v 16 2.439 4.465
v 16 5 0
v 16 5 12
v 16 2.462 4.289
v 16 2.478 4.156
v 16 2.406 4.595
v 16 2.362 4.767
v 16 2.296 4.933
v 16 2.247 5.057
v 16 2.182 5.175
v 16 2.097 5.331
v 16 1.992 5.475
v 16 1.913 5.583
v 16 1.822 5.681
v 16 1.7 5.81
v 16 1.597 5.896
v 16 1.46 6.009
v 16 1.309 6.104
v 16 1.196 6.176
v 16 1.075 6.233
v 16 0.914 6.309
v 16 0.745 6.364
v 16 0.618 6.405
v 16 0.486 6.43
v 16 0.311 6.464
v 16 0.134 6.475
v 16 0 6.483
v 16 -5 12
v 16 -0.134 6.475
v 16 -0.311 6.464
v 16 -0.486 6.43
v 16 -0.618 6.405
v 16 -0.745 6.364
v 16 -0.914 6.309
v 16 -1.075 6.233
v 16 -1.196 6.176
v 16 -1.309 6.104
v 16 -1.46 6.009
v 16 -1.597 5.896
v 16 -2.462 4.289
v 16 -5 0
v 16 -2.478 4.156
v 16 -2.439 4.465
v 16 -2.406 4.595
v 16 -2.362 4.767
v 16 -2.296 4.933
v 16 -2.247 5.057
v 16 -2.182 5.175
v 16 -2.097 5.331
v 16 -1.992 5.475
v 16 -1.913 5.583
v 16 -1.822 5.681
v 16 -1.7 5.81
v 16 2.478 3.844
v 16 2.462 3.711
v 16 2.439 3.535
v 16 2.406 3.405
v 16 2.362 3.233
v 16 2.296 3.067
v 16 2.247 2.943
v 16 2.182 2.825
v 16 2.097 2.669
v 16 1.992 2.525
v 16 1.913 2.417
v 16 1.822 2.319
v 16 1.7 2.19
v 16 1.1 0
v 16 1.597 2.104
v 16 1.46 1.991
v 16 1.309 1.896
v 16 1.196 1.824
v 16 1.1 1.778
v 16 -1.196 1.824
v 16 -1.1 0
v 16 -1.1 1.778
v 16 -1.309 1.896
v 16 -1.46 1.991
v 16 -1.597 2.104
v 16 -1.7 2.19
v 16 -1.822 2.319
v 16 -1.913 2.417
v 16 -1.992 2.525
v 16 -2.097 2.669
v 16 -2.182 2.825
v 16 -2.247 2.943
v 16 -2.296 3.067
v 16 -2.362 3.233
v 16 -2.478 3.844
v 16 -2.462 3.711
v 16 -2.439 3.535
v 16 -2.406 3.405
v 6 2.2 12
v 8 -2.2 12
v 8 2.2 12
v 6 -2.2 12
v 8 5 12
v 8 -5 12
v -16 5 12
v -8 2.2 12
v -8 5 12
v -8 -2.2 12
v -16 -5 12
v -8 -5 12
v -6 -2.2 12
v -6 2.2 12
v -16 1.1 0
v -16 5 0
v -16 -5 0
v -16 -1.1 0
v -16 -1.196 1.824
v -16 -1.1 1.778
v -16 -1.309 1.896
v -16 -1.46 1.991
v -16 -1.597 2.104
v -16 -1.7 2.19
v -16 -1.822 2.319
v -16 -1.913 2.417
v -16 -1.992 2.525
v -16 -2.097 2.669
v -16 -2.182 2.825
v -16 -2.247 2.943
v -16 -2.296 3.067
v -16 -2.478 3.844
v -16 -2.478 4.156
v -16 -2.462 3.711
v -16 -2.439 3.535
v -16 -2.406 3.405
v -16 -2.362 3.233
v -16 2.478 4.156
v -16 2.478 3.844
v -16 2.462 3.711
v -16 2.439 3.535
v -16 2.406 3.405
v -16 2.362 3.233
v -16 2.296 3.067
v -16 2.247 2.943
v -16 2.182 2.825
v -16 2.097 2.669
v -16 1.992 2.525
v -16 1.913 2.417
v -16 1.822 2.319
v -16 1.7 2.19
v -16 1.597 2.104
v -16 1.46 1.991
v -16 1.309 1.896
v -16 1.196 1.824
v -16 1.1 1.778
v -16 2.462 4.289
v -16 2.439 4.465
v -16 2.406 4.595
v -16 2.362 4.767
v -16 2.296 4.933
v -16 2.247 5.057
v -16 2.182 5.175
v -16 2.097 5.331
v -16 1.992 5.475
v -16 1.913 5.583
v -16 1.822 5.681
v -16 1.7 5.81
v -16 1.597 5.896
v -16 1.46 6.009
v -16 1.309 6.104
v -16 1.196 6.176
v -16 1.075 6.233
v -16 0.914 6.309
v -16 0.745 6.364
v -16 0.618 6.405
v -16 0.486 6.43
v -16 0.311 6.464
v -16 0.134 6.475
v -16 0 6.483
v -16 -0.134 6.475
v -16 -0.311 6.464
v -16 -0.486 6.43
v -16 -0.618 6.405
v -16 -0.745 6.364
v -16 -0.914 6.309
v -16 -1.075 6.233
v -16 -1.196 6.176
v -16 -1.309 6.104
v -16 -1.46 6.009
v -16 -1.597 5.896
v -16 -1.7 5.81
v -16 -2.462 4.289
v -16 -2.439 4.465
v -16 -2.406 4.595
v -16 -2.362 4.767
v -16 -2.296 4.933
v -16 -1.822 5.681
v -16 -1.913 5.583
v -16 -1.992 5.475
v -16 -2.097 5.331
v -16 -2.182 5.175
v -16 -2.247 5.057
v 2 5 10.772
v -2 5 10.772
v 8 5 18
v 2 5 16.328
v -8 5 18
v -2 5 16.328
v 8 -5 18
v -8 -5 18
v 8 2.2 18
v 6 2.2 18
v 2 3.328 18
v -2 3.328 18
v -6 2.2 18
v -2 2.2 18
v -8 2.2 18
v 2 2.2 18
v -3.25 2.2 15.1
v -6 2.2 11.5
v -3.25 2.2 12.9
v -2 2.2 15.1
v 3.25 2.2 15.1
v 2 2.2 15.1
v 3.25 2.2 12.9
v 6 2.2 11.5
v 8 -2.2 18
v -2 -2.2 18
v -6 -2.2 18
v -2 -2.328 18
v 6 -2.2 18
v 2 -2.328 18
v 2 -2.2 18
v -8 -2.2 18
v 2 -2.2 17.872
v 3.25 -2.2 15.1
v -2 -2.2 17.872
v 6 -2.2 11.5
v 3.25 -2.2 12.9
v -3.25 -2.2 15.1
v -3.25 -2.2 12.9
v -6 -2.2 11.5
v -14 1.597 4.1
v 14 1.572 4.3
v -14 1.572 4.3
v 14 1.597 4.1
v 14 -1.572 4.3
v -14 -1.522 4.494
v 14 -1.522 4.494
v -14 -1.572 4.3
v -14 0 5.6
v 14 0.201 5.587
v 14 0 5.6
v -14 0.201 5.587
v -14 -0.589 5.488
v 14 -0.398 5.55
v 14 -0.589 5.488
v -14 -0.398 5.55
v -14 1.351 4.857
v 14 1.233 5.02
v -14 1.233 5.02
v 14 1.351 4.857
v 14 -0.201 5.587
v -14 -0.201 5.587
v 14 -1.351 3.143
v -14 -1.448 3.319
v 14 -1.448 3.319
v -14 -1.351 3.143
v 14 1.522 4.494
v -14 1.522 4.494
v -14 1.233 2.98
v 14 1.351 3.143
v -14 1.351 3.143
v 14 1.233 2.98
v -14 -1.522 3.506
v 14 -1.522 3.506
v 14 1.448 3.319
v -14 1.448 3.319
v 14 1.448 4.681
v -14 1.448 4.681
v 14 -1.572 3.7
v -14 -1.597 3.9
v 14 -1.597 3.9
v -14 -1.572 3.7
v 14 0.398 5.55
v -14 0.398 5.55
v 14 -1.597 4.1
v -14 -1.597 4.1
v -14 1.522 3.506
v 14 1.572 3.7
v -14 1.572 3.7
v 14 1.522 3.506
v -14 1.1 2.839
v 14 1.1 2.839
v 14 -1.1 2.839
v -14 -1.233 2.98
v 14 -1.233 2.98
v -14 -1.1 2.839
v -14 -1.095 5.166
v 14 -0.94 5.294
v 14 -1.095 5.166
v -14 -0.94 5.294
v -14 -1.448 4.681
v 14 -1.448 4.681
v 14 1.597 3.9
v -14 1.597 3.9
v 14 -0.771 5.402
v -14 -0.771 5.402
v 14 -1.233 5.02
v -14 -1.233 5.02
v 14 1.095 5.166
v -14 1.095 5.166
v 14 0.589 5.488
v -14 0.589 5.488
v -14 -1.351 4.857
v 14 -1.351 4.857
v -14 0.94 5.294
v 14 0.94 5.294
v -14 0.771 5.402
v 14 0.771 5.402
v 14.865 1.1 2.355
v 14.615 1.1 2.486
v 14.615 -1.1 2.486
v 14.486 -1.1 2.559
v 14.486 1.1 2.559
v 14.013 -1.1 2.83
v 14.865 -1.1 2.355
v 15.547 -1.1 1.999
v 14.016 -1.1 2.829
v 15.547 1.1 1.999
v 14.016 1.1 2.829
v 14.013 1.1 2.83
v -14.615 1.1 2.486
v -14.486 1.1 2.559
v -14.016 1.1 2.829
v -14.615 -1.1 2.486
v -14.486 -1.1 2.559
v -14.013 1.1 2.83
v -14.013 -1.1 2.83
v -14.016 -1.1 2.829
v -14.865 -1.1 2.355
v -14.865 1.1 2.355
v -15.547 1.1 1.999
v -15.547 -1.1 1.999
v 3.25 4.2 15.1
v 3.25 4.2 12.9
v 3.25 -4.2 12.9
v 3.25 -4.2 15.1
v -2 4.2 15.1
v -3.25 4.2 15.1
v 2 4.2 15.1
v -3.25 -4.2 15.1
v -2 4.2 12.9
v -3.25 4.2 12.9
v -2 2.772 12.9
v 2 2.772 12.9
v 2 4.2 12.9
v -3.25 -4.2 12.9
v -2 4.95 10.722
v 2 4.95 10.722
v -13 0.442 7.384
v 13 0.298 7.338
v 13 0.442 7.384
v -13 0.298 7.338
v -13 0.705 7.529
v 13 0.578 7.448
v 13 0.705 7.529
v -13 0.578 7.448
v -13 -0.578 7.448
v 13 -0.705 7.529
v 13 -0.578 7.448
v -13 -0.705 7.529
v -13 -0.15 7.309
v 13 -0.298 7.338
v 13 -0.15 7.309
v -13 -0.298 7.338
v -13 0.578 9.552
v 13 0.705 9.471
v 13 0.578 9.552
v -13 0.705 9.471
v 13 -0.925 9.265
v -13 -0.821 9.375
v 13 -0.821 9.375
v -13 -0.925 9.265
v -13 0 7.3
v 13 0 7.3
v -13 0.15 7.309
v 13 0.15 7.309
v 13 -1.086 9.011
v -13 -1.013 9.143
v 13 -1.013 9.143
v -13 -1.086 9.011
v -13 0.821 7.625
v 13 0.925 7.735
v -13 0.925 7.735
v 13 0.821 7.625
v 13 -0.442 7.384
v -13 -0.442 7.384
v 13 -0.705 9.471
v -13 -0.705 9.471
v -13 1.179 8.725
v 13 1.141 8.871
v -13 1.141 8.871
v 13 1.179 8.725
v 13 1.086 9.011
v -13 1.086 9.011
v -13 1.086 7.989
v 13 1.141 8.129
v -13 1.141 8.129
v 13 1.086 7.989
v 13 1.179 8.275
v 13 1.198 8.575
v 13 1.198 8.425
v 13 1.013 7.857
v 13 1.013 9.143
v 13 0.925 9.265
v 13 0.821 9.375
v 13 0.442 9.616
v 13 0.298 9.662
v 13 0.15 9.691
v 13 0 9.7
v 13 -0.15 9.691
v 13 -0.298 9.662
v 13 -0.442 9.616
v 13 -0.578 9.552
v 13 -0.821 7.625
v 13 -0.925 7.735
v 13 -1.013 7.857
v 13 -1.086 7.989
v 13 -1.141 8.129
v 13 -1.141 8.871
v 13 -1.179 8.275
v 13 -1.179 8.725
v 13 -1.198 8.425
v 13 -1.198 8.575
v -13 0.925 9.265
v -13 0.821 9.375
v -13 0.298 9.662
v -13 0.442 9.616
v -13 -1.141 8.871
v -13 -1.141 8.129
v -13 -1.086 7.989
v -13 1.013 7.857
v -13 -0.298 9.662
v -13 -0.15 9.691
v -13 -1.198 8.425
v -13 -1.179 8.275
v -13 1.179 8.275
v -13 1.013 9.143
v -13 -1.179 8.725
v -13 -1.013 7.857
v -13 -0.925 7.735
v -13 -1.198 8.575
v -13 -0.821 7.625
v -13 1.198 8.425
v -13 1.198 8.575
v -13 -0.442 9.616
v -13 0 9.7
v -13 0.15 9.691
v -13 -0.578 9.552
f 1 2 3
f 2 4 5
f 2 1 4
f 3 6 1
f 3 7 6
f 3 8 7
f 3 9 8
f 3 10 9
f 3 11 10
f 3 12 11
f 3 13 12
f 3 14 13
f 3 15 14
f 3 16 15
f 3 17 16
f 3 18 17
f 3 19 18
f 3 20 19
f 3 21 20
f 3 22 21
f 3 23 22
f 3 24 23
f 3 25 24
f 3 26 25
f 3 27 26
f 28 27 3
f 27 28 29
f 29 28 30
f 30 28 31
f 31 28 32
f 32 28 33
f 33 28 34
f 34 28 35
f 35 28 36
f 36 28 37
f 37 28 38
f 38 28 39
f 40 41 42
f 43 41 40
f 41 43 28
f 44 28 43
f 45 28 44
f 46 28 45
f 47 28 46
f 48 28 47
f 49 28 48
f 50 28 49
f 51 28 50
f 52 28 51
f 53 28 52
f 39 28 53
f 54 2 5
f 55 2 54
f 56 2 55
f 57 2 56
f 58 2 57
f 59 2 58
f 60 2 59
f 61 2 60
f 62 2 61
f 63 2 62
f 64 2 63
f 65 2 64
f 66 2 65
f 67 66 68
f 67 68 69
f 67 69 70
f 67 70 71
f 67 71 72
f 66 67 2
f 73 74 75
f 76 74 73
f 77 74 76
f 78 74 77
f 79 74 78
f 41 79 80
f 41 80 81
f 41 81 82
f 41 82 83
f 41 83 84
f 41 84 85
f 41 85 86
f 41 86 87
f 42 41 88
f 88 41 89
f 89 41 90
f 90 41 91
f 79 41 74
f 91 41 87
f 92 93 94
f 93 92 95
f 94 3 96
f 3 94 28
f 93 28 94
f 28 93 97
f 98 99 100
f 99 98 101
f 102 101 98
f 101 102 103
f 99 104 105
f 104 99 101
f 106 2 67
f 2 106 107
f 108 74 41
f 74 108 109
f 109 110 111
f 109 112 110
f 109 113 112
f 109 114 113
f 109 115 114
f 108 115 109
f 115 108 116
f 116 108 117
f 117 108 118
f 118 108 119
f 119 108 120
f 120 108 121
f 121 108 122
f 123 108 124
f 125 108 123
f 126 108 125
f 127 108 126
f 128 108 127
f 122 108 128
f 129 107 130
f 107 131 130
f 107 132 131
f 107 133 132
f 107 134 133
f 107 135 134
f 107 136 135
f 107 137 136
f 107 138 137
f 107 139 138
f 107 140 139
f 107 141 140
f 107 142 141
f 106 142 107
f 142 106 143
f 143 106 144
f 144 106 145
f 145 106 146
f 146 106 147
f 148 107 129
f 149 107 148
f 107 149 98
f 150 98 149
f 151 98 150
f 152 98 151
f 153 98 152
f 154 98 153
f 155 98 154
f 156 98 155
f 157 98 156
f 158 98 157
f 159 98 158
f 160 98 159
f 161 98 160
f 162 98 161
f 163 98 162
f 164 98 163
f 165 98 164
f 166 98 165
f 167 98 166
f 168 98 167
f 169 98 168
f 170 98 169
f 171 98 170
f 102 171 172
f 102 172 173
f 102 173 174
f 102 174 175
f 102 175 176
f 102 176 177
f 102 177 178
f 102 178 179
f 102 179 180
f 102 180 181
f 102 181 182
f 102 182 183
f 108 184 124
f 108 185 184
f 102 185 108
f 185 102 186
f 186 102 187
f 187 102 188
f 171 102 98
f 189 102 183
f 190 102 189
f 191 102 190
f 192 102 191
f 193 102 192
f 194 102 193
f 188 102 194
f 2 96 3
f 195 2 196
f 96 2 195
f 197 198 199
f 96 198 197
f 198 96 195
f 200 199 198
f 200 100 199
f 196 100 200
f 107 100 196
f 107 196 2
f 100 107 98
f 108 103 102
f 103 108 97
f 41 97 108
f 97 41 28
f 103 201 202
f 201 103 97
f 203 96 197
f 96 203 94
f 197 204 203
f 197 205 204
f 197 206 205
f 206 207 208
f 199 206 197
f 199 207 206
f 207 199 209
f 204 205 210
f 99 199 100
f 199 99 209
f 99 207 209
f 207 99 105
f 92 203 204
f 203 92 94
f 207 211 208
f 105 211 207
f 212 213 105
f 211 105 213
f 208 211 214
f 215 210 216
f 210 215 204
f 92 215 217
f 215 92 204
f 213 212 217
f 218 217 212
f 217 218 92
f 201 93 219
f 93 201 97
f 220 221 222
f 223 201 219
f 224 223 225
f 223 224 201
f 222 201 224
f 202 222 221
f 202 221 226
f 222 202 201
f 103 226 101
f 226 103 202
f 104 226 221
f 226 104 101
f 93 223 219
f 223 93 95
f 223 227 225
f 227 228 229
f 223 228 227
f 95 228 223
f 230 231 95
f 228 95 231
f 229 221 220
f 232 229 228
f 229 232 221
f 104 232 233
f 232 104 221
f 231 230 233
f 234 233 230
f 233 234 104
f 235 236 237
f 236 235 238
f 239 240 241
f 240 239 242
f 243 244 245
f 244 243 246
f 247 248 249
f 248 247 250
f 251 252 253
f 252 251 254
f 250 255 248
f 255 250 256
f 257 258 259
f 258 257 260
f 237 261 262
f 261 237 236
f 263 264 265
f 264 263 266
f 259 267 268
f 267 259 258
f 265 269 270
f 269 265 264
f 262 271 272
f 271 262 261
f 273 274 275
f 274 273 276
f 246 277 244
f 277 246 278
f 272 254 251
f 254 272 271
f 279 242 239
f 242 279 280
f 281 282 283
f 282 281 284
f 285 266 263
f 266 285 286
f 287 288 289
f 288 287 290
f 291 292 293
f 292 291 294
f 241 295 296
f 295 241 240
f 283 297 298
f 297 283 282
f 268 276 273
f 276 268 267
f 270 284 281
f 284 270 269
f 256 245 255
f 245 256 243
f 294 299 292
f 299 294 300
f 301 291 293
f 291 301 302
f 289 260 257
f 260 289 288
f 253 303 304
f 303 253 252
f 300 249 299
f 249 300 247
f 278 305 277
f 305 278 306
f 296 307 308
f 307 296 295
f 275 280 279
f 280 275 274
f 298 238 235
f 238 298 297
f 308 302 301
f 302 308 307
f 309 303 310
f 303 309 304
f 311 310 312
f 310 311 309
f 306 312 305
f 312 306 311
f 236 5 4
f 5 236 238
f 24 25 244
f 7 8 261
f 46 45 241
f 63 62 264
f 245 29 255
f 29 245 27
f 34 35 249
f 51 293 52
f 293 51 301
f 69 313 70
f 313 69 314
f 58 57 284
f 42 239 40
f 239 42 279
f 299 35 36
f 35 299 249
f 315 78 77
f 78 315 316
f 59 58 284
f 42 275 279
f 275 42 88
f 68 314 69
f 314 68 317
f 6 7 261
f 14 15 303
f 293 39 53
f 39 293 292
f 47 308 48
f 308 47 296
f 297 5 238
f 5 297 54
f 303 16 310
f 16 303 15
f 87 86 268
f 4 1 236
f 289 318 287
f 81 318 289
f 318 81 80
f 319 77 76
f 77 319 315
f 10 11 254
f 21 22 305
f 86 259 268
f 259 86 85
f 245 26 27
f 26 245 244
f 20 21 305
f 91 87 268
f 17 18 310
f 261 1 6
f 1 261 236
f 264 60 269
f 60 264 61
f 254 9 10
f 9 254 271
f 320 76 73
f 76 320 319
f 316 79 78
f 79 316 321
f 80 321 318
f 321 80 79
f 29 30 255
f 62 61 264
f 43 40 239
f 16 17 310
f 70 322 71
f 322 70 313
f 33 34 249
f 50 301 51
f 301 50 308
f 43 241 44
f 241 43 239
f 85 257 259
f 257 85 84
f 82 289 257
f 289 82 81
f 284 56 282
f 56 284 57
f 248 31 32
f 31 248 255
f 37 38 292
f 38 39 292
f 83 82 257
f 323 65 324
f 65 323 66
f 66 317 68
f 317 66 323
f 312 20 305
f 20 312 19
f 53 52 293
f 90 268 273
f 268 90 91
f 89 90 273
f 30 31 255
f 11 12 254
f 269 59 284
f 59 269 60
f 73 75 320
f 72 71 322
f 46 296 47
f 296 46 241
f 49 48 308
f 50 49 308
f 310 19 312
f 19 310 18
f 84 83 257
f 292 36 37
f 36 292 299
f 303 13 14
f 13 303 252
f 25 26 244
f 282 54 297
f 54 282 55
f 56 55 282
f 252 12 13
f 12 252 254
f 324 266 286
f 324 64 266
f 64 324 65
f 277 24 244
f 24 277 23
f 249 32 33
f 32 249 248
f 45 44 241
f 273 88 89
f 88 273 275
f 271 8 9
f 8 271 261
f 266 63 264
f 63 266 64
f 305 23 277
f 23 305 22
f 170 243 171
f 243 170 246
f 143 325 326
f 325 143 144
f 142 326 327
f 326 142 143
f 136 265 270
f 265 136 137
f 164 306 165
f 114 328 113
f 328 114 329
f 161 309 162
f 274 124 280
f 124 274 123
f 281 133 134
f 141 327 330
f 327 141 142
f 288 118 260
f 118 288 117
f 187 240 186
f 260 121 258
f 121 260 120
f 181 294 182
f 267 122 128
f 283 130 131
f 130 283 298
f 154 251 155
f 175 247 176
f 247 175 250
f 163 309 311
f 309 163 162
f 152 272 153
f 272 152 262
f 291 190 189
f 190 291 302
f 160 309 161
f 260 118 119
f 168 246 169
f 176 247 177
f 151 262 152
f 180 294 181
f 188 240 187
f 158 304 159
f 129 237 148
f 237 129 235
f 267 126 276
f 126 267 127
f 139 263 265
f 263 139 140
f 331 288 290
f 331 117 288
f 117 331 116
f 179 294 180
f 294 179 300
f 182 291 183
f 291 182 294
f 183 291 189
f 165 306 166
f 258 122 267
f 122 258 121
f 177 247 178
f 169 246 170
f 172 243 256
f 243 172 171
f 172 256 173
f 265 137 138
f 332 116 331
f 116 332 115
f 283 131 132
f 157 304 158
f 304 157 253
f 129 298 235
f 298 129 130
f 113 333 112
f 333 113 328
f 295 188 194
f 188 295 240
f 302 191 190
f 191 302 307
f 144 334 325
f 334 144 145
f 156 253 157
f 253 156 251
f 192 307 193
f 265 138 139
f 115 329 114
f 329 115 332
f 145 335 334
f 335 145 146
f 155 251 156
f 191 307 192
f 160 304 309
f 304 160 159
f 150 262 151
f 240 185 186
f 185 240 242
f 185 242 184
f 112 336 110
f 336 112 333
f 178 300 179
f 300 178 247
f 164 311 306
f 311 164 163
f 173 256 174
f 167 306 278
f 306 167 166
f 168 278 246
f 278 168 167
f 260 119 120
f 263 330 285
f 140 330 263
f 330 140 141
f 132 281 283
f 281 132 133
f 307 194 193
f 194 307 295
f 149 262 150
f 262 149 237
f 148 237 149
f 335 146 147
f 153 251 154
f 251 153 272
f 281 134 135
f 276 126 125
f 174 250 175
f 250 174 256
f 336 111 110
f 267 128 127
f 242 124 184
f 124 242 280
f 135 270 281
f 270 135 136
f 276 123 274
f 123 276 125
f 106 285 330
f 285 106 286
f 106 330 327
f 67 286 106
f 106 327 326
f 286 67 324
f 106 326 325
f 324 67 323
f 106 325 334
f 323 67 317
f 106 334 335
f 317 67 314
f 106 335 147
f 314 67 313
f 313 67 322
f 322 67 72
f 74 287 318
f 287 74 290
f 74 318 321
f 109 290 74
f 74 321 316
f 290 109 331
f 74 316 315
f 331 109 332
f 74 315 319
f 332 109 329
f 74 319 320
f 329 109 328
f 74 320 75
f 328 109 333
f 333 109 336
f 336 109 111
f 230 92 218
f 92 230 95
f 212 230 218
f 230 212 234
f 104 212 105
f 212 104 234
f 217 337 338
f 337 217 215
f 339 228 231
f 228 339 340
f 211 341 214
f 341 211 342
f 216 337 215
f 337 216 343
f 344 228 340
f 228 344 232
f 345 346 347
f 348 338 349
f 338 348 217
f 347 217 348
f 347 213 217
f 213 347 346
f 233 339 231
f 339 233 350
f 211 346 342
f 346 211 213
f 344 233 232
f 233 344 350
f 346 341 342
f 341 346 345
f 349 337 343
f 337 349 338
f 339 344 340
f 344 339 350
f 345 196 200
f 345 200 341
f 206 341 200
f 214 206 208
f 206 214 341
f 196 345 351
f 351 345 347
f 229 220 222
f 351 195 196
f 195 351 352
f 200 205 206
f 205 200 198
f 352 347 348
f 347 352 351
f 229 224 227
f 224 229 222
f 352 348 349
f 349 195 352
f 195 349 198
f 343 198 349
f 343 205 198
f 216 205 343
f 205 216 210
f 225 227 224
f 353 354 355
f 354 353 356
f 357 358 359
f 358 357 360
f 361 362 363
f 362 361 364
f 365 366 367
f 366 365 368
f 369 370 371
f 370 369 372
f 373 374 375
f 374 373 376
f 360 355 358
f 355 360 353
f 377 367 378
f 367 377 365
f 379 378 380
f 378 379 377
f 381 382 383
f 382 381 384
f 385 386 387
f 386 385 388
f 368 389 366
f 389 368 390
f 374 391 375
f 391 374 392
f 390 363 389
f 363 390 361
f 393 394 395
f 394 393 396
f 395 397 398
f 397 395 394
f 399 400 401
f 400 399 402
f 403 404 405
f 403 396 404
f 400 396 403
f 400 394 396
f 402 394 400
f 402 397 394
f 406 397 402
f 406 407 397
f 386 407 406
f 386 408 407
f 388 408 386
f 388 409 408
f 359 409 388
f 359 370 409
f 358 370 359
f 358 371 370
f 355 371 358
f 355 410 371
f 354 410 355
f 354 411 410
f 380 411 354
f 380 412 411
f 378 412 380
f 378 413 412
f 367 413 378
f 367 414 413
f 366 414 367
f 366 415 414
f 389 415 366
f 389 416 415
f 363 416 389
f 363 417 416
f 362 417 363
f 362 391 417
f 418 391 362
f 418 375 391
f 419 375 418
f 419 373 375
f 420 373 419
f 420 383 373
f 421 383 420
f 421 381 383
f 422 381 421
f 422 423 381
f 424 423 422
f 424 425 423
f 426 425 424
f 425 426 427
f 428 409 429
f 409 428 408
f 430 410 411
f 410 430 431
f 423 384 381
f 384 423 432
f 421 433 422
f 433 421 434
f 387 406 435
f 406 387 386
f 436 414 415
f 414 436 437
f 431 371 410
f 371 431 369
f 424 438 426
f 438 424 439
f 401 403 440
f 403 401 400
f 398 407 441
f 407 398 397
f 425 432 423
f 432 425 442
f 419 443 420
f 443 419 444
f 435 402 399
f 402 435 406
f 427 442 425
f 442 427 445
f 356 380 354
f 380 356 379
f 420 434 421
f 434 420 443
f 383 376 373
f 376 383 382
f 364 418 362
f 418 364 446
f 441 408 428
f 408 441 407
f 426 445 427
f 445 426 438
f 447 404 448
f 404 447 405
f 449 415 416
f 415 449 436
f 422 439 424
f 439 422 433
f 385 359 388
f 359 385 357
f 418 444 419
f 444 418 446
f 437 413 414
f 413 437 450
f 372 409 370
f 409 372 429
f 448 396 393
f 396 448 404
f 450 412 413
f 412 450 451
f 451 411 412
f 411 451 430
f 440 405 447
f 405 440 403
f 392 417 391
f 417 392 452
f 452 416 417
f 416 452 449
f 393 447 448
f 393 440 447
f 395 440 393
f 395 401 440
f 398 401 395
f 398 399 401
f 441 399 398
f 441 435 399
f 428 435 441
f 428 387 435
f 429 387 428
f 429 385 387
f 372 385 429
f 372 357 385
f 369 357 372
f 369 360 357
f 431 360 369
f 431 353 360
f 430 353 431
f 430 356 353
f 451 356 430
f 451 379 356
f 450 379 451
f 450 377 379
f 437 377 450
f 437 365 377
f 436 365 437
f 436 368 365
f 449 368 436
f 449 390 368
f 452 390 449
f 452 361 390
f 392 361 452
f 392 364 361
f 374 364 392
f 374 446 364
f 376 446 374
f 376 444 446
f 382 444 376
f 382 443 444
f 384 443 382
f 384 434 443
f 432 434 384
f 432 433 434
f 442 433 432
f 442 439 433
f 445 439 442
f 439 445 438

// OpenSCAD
// ====================================================================
// [PRINT 04] Alpine Cable Glider Sled Runner (100% Snap-In - Zero Holes)
//
// Features:
// - Top Glider Channel: Smooth cable channel bore with trumpet funnels.
// - Bottom Barb-Lock Socket: Receives top wedge barb of C-Hanger Arm (03).
// - Sits 100% flat on build plate at Z = 0 (printed upside down).
// - ZERO TINY PROTRUSIONS / PINS! ZERO SCREWS! ZERO SUPPORTS NEEDED!
// ====================================================================

$fn = 50;

chassis_l    = 32.0; // Overall glider length (mm)
chassis_w    = 10.0; // Overall glider width (mm)
chassis_h    = 12.0; // Chassis height (mm)
cable_bore_d = 3.2;  // Inner smooth cable channel diameter
clevis_gap   = 4.4;  // Fits 4.0mm hanger arm tab
clevis_ear_h = 6.0;  // Lower clevis ear height

module trolley_carriage_glider_print() {
    difference() {
        union() {
            // Main chassis block (flat on bed at Z = 0)
            translate([0, 0, chassis_h / 2])
                cube([chassis_l, chassis_w, chassis_h], center = true);
            
            // Lower hanger clevis ears
            translate([0, (clevis_gap + (chassis_w - clevis_gap)/2) / 2, chassis_h + clevis_ear_h / 2])
                cube([16.0, (chassis_w - clevis_gap)/2, clevis_ear_h], center = true);
            translate([0, -(clevis_gap + (chassis_w - clevis_gap)/2) / 2, chassis_h + clevis_ear_h / 2])
                cube([16.0, (chassis_w - clevis_gap)/2, clevis_ear_h], center = true);
        }

        // 1. Longitudinal smooth cable tunnel bore
        translate([0, 0, 4.0])
            rotate([0, 90, 0])
                cylinder(d = cable_bore_d, h = chassis_l + 4, center = true);

        // 2. Flared trumpet entry funnels at both ends (+X and -X)
        translate([chassis_l / 2 - 2, 0, 4.0])
            rotate([0, 90, 0])
                cylinder(d1 = cable_bore_d, d2 = 8.5, h = 6.0);
        translate([-chassis_l / 2 + 2, 0, 4.0])
            rotate([0, -90, 0])
                cylinder(d1 = cable_bore_d, d2 = 8.5, h = 6.0);

        // 3. Top snap-entry slot (2.2mm top opening)
        translate([0, 0, 2.0])
            cube([chassis_l + 4, 2.2, 5.0], center = true);

        // --- INTERNAL BARB-LOCK SHOULDERS (RECEIVES HANGER ARM BARB) ---
        // 4. Central receiving slot for 4.0mm C-Hanger Arm top tab
        translate([0, 0, chassis_h + clevis_ear_h / 2 + 0.5])
            cube([12.0, clevis_gap, clevis_ear_h + 2], center = true);

        // 5. Internal Barb-Lock Shoulders (6.5mm width inside slot)
        translate([0, 0, chassis_h + 2.0])
            cube([6.5, clevis_gap + 4.0, 2.2], center = true);

        // 6. 45-degree self-guiding lead-in chamfer mouth at entry
        translate([0, 0, chassis_h + clevis_ear_h + 0.5])
            rotate([45, 0, 0])
                cube([4.0, 4.0, 18.0], center = true);

        // Optional haul-line tie-off slots (for motorized pull string)
        translate([6, 0, 8.5])
            rotate([0, 90, 0])
                cylinder(d = 2.4, h = chassis_w + 4, center = true);
        translate([-6, 0, 8.5])
            rotate([0, 90, 0])
                cylinder(d = 2.4, h = chassis_w + 4, center = true);
    }
}

// Render flat on bed at Z = 0
trolley_carriage_glider_print();
